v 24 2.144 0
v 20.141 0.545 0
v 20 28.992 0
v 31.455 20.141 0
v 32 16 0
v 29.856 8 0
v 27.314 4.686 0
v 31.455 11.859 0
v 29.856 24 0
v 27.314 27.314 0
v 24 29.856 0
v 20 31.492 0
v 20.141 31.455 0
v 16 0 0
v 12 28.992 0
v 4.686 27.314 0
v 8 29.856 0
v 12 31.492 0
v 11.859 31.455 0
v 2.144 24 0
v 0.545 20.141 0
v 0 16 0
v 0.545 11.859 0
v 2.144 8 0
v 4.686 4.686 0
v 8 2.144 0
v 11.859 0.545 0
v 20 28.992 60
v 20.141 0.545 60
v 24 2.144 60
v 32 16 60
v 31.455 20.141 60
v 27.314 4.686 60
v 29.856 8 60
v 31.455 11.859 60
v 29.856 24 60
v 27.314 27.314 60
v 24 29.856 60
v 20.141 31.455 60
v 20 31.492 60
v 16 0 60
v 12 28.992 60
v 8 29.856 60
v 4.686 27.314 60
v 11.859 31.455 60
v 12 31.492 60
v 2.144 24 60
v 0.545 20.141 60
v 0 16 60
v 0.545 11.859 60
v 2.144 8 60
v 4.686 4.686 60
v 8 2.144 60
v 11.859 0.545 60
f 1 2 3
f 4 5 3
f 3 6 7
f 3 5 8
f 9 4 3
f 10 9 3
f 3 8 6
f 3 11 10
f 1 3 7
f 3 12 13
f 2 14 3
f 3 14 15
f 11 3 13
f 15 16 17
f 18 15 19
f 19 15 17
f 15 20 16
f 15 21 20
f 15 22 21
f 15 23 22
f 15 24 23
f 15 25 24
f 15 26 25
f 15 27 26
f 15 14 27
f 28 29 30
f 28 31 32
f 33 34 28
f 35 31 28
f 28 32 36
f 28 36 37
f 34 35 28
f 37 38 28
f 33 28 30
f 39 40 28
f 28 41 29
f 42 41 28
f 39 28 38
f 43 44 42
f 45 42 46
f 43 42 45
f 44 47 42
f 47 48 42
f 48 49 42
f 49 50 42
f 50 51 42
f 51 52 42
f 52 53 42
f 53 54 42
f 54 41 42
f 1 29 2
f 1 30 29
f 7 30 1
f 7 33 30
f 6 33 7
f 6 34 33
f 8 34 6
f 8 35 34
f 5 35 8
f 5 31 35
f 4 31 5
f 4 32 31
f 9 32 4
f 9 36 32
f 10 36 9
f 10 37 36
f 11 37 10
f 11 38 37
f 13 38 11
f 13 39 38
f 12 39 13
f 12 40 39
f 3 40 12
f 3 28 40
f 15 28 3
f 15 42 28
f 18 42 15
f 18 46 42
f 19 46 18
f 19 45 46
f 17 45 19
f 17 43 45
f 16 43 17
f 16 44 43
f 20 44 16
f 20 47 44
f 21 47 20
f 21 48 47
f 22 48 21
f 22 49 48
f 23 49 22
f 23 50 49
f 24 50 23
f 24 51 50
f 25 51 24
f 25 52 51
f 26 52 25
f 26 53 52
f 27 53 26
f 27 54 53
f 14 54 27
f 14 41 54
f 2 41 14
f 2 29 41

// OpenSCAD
$fn = 32;

// ----------------------------------------------------------------------
// Keyway shaft: d32 shaft, key 8 x 2.5 mm
// ----------------------------------------------------------------------

// --- parameters (mm) ---
shaft_r = 16;             // shaft radius
key_w = 8;                // keyway width
key_d = 2.5;              // keyway depth below the surface line
plate_t = 60;             // shaft length, Z (extrusion height)

shaft_d = 2 * shaft_r;  // shaft diameter
circle_step = 15;  // polygon sampling step, degrees

profile = [[11.859, 31.455], [8, 29.856], [4.686, 27.314], [2.144, 24], [0.545, 20.141], [0, 16], [0.545, 11.859], [2.144, 8], [4.686, 4.686], [8, 2.144], [11.859, 0.545], [16, 0], [20.141, 0.545], [24, 2.144], [27.314, 4.686], [29.856, 8], [31.455, 11.859], [32, 16], [31.455, 20.141], [29.856, 24], [27.314, 27.314], [24, 29.856], [20.141, 31.455], [20, 31.492], [20, 28.992], [12, 28.992], [12, 31.492]];  // primary outline, 27 points, counter clockwise

// --- the one profile operation ---
linear_extrude(height = plate_t) polygon(points = profile);
